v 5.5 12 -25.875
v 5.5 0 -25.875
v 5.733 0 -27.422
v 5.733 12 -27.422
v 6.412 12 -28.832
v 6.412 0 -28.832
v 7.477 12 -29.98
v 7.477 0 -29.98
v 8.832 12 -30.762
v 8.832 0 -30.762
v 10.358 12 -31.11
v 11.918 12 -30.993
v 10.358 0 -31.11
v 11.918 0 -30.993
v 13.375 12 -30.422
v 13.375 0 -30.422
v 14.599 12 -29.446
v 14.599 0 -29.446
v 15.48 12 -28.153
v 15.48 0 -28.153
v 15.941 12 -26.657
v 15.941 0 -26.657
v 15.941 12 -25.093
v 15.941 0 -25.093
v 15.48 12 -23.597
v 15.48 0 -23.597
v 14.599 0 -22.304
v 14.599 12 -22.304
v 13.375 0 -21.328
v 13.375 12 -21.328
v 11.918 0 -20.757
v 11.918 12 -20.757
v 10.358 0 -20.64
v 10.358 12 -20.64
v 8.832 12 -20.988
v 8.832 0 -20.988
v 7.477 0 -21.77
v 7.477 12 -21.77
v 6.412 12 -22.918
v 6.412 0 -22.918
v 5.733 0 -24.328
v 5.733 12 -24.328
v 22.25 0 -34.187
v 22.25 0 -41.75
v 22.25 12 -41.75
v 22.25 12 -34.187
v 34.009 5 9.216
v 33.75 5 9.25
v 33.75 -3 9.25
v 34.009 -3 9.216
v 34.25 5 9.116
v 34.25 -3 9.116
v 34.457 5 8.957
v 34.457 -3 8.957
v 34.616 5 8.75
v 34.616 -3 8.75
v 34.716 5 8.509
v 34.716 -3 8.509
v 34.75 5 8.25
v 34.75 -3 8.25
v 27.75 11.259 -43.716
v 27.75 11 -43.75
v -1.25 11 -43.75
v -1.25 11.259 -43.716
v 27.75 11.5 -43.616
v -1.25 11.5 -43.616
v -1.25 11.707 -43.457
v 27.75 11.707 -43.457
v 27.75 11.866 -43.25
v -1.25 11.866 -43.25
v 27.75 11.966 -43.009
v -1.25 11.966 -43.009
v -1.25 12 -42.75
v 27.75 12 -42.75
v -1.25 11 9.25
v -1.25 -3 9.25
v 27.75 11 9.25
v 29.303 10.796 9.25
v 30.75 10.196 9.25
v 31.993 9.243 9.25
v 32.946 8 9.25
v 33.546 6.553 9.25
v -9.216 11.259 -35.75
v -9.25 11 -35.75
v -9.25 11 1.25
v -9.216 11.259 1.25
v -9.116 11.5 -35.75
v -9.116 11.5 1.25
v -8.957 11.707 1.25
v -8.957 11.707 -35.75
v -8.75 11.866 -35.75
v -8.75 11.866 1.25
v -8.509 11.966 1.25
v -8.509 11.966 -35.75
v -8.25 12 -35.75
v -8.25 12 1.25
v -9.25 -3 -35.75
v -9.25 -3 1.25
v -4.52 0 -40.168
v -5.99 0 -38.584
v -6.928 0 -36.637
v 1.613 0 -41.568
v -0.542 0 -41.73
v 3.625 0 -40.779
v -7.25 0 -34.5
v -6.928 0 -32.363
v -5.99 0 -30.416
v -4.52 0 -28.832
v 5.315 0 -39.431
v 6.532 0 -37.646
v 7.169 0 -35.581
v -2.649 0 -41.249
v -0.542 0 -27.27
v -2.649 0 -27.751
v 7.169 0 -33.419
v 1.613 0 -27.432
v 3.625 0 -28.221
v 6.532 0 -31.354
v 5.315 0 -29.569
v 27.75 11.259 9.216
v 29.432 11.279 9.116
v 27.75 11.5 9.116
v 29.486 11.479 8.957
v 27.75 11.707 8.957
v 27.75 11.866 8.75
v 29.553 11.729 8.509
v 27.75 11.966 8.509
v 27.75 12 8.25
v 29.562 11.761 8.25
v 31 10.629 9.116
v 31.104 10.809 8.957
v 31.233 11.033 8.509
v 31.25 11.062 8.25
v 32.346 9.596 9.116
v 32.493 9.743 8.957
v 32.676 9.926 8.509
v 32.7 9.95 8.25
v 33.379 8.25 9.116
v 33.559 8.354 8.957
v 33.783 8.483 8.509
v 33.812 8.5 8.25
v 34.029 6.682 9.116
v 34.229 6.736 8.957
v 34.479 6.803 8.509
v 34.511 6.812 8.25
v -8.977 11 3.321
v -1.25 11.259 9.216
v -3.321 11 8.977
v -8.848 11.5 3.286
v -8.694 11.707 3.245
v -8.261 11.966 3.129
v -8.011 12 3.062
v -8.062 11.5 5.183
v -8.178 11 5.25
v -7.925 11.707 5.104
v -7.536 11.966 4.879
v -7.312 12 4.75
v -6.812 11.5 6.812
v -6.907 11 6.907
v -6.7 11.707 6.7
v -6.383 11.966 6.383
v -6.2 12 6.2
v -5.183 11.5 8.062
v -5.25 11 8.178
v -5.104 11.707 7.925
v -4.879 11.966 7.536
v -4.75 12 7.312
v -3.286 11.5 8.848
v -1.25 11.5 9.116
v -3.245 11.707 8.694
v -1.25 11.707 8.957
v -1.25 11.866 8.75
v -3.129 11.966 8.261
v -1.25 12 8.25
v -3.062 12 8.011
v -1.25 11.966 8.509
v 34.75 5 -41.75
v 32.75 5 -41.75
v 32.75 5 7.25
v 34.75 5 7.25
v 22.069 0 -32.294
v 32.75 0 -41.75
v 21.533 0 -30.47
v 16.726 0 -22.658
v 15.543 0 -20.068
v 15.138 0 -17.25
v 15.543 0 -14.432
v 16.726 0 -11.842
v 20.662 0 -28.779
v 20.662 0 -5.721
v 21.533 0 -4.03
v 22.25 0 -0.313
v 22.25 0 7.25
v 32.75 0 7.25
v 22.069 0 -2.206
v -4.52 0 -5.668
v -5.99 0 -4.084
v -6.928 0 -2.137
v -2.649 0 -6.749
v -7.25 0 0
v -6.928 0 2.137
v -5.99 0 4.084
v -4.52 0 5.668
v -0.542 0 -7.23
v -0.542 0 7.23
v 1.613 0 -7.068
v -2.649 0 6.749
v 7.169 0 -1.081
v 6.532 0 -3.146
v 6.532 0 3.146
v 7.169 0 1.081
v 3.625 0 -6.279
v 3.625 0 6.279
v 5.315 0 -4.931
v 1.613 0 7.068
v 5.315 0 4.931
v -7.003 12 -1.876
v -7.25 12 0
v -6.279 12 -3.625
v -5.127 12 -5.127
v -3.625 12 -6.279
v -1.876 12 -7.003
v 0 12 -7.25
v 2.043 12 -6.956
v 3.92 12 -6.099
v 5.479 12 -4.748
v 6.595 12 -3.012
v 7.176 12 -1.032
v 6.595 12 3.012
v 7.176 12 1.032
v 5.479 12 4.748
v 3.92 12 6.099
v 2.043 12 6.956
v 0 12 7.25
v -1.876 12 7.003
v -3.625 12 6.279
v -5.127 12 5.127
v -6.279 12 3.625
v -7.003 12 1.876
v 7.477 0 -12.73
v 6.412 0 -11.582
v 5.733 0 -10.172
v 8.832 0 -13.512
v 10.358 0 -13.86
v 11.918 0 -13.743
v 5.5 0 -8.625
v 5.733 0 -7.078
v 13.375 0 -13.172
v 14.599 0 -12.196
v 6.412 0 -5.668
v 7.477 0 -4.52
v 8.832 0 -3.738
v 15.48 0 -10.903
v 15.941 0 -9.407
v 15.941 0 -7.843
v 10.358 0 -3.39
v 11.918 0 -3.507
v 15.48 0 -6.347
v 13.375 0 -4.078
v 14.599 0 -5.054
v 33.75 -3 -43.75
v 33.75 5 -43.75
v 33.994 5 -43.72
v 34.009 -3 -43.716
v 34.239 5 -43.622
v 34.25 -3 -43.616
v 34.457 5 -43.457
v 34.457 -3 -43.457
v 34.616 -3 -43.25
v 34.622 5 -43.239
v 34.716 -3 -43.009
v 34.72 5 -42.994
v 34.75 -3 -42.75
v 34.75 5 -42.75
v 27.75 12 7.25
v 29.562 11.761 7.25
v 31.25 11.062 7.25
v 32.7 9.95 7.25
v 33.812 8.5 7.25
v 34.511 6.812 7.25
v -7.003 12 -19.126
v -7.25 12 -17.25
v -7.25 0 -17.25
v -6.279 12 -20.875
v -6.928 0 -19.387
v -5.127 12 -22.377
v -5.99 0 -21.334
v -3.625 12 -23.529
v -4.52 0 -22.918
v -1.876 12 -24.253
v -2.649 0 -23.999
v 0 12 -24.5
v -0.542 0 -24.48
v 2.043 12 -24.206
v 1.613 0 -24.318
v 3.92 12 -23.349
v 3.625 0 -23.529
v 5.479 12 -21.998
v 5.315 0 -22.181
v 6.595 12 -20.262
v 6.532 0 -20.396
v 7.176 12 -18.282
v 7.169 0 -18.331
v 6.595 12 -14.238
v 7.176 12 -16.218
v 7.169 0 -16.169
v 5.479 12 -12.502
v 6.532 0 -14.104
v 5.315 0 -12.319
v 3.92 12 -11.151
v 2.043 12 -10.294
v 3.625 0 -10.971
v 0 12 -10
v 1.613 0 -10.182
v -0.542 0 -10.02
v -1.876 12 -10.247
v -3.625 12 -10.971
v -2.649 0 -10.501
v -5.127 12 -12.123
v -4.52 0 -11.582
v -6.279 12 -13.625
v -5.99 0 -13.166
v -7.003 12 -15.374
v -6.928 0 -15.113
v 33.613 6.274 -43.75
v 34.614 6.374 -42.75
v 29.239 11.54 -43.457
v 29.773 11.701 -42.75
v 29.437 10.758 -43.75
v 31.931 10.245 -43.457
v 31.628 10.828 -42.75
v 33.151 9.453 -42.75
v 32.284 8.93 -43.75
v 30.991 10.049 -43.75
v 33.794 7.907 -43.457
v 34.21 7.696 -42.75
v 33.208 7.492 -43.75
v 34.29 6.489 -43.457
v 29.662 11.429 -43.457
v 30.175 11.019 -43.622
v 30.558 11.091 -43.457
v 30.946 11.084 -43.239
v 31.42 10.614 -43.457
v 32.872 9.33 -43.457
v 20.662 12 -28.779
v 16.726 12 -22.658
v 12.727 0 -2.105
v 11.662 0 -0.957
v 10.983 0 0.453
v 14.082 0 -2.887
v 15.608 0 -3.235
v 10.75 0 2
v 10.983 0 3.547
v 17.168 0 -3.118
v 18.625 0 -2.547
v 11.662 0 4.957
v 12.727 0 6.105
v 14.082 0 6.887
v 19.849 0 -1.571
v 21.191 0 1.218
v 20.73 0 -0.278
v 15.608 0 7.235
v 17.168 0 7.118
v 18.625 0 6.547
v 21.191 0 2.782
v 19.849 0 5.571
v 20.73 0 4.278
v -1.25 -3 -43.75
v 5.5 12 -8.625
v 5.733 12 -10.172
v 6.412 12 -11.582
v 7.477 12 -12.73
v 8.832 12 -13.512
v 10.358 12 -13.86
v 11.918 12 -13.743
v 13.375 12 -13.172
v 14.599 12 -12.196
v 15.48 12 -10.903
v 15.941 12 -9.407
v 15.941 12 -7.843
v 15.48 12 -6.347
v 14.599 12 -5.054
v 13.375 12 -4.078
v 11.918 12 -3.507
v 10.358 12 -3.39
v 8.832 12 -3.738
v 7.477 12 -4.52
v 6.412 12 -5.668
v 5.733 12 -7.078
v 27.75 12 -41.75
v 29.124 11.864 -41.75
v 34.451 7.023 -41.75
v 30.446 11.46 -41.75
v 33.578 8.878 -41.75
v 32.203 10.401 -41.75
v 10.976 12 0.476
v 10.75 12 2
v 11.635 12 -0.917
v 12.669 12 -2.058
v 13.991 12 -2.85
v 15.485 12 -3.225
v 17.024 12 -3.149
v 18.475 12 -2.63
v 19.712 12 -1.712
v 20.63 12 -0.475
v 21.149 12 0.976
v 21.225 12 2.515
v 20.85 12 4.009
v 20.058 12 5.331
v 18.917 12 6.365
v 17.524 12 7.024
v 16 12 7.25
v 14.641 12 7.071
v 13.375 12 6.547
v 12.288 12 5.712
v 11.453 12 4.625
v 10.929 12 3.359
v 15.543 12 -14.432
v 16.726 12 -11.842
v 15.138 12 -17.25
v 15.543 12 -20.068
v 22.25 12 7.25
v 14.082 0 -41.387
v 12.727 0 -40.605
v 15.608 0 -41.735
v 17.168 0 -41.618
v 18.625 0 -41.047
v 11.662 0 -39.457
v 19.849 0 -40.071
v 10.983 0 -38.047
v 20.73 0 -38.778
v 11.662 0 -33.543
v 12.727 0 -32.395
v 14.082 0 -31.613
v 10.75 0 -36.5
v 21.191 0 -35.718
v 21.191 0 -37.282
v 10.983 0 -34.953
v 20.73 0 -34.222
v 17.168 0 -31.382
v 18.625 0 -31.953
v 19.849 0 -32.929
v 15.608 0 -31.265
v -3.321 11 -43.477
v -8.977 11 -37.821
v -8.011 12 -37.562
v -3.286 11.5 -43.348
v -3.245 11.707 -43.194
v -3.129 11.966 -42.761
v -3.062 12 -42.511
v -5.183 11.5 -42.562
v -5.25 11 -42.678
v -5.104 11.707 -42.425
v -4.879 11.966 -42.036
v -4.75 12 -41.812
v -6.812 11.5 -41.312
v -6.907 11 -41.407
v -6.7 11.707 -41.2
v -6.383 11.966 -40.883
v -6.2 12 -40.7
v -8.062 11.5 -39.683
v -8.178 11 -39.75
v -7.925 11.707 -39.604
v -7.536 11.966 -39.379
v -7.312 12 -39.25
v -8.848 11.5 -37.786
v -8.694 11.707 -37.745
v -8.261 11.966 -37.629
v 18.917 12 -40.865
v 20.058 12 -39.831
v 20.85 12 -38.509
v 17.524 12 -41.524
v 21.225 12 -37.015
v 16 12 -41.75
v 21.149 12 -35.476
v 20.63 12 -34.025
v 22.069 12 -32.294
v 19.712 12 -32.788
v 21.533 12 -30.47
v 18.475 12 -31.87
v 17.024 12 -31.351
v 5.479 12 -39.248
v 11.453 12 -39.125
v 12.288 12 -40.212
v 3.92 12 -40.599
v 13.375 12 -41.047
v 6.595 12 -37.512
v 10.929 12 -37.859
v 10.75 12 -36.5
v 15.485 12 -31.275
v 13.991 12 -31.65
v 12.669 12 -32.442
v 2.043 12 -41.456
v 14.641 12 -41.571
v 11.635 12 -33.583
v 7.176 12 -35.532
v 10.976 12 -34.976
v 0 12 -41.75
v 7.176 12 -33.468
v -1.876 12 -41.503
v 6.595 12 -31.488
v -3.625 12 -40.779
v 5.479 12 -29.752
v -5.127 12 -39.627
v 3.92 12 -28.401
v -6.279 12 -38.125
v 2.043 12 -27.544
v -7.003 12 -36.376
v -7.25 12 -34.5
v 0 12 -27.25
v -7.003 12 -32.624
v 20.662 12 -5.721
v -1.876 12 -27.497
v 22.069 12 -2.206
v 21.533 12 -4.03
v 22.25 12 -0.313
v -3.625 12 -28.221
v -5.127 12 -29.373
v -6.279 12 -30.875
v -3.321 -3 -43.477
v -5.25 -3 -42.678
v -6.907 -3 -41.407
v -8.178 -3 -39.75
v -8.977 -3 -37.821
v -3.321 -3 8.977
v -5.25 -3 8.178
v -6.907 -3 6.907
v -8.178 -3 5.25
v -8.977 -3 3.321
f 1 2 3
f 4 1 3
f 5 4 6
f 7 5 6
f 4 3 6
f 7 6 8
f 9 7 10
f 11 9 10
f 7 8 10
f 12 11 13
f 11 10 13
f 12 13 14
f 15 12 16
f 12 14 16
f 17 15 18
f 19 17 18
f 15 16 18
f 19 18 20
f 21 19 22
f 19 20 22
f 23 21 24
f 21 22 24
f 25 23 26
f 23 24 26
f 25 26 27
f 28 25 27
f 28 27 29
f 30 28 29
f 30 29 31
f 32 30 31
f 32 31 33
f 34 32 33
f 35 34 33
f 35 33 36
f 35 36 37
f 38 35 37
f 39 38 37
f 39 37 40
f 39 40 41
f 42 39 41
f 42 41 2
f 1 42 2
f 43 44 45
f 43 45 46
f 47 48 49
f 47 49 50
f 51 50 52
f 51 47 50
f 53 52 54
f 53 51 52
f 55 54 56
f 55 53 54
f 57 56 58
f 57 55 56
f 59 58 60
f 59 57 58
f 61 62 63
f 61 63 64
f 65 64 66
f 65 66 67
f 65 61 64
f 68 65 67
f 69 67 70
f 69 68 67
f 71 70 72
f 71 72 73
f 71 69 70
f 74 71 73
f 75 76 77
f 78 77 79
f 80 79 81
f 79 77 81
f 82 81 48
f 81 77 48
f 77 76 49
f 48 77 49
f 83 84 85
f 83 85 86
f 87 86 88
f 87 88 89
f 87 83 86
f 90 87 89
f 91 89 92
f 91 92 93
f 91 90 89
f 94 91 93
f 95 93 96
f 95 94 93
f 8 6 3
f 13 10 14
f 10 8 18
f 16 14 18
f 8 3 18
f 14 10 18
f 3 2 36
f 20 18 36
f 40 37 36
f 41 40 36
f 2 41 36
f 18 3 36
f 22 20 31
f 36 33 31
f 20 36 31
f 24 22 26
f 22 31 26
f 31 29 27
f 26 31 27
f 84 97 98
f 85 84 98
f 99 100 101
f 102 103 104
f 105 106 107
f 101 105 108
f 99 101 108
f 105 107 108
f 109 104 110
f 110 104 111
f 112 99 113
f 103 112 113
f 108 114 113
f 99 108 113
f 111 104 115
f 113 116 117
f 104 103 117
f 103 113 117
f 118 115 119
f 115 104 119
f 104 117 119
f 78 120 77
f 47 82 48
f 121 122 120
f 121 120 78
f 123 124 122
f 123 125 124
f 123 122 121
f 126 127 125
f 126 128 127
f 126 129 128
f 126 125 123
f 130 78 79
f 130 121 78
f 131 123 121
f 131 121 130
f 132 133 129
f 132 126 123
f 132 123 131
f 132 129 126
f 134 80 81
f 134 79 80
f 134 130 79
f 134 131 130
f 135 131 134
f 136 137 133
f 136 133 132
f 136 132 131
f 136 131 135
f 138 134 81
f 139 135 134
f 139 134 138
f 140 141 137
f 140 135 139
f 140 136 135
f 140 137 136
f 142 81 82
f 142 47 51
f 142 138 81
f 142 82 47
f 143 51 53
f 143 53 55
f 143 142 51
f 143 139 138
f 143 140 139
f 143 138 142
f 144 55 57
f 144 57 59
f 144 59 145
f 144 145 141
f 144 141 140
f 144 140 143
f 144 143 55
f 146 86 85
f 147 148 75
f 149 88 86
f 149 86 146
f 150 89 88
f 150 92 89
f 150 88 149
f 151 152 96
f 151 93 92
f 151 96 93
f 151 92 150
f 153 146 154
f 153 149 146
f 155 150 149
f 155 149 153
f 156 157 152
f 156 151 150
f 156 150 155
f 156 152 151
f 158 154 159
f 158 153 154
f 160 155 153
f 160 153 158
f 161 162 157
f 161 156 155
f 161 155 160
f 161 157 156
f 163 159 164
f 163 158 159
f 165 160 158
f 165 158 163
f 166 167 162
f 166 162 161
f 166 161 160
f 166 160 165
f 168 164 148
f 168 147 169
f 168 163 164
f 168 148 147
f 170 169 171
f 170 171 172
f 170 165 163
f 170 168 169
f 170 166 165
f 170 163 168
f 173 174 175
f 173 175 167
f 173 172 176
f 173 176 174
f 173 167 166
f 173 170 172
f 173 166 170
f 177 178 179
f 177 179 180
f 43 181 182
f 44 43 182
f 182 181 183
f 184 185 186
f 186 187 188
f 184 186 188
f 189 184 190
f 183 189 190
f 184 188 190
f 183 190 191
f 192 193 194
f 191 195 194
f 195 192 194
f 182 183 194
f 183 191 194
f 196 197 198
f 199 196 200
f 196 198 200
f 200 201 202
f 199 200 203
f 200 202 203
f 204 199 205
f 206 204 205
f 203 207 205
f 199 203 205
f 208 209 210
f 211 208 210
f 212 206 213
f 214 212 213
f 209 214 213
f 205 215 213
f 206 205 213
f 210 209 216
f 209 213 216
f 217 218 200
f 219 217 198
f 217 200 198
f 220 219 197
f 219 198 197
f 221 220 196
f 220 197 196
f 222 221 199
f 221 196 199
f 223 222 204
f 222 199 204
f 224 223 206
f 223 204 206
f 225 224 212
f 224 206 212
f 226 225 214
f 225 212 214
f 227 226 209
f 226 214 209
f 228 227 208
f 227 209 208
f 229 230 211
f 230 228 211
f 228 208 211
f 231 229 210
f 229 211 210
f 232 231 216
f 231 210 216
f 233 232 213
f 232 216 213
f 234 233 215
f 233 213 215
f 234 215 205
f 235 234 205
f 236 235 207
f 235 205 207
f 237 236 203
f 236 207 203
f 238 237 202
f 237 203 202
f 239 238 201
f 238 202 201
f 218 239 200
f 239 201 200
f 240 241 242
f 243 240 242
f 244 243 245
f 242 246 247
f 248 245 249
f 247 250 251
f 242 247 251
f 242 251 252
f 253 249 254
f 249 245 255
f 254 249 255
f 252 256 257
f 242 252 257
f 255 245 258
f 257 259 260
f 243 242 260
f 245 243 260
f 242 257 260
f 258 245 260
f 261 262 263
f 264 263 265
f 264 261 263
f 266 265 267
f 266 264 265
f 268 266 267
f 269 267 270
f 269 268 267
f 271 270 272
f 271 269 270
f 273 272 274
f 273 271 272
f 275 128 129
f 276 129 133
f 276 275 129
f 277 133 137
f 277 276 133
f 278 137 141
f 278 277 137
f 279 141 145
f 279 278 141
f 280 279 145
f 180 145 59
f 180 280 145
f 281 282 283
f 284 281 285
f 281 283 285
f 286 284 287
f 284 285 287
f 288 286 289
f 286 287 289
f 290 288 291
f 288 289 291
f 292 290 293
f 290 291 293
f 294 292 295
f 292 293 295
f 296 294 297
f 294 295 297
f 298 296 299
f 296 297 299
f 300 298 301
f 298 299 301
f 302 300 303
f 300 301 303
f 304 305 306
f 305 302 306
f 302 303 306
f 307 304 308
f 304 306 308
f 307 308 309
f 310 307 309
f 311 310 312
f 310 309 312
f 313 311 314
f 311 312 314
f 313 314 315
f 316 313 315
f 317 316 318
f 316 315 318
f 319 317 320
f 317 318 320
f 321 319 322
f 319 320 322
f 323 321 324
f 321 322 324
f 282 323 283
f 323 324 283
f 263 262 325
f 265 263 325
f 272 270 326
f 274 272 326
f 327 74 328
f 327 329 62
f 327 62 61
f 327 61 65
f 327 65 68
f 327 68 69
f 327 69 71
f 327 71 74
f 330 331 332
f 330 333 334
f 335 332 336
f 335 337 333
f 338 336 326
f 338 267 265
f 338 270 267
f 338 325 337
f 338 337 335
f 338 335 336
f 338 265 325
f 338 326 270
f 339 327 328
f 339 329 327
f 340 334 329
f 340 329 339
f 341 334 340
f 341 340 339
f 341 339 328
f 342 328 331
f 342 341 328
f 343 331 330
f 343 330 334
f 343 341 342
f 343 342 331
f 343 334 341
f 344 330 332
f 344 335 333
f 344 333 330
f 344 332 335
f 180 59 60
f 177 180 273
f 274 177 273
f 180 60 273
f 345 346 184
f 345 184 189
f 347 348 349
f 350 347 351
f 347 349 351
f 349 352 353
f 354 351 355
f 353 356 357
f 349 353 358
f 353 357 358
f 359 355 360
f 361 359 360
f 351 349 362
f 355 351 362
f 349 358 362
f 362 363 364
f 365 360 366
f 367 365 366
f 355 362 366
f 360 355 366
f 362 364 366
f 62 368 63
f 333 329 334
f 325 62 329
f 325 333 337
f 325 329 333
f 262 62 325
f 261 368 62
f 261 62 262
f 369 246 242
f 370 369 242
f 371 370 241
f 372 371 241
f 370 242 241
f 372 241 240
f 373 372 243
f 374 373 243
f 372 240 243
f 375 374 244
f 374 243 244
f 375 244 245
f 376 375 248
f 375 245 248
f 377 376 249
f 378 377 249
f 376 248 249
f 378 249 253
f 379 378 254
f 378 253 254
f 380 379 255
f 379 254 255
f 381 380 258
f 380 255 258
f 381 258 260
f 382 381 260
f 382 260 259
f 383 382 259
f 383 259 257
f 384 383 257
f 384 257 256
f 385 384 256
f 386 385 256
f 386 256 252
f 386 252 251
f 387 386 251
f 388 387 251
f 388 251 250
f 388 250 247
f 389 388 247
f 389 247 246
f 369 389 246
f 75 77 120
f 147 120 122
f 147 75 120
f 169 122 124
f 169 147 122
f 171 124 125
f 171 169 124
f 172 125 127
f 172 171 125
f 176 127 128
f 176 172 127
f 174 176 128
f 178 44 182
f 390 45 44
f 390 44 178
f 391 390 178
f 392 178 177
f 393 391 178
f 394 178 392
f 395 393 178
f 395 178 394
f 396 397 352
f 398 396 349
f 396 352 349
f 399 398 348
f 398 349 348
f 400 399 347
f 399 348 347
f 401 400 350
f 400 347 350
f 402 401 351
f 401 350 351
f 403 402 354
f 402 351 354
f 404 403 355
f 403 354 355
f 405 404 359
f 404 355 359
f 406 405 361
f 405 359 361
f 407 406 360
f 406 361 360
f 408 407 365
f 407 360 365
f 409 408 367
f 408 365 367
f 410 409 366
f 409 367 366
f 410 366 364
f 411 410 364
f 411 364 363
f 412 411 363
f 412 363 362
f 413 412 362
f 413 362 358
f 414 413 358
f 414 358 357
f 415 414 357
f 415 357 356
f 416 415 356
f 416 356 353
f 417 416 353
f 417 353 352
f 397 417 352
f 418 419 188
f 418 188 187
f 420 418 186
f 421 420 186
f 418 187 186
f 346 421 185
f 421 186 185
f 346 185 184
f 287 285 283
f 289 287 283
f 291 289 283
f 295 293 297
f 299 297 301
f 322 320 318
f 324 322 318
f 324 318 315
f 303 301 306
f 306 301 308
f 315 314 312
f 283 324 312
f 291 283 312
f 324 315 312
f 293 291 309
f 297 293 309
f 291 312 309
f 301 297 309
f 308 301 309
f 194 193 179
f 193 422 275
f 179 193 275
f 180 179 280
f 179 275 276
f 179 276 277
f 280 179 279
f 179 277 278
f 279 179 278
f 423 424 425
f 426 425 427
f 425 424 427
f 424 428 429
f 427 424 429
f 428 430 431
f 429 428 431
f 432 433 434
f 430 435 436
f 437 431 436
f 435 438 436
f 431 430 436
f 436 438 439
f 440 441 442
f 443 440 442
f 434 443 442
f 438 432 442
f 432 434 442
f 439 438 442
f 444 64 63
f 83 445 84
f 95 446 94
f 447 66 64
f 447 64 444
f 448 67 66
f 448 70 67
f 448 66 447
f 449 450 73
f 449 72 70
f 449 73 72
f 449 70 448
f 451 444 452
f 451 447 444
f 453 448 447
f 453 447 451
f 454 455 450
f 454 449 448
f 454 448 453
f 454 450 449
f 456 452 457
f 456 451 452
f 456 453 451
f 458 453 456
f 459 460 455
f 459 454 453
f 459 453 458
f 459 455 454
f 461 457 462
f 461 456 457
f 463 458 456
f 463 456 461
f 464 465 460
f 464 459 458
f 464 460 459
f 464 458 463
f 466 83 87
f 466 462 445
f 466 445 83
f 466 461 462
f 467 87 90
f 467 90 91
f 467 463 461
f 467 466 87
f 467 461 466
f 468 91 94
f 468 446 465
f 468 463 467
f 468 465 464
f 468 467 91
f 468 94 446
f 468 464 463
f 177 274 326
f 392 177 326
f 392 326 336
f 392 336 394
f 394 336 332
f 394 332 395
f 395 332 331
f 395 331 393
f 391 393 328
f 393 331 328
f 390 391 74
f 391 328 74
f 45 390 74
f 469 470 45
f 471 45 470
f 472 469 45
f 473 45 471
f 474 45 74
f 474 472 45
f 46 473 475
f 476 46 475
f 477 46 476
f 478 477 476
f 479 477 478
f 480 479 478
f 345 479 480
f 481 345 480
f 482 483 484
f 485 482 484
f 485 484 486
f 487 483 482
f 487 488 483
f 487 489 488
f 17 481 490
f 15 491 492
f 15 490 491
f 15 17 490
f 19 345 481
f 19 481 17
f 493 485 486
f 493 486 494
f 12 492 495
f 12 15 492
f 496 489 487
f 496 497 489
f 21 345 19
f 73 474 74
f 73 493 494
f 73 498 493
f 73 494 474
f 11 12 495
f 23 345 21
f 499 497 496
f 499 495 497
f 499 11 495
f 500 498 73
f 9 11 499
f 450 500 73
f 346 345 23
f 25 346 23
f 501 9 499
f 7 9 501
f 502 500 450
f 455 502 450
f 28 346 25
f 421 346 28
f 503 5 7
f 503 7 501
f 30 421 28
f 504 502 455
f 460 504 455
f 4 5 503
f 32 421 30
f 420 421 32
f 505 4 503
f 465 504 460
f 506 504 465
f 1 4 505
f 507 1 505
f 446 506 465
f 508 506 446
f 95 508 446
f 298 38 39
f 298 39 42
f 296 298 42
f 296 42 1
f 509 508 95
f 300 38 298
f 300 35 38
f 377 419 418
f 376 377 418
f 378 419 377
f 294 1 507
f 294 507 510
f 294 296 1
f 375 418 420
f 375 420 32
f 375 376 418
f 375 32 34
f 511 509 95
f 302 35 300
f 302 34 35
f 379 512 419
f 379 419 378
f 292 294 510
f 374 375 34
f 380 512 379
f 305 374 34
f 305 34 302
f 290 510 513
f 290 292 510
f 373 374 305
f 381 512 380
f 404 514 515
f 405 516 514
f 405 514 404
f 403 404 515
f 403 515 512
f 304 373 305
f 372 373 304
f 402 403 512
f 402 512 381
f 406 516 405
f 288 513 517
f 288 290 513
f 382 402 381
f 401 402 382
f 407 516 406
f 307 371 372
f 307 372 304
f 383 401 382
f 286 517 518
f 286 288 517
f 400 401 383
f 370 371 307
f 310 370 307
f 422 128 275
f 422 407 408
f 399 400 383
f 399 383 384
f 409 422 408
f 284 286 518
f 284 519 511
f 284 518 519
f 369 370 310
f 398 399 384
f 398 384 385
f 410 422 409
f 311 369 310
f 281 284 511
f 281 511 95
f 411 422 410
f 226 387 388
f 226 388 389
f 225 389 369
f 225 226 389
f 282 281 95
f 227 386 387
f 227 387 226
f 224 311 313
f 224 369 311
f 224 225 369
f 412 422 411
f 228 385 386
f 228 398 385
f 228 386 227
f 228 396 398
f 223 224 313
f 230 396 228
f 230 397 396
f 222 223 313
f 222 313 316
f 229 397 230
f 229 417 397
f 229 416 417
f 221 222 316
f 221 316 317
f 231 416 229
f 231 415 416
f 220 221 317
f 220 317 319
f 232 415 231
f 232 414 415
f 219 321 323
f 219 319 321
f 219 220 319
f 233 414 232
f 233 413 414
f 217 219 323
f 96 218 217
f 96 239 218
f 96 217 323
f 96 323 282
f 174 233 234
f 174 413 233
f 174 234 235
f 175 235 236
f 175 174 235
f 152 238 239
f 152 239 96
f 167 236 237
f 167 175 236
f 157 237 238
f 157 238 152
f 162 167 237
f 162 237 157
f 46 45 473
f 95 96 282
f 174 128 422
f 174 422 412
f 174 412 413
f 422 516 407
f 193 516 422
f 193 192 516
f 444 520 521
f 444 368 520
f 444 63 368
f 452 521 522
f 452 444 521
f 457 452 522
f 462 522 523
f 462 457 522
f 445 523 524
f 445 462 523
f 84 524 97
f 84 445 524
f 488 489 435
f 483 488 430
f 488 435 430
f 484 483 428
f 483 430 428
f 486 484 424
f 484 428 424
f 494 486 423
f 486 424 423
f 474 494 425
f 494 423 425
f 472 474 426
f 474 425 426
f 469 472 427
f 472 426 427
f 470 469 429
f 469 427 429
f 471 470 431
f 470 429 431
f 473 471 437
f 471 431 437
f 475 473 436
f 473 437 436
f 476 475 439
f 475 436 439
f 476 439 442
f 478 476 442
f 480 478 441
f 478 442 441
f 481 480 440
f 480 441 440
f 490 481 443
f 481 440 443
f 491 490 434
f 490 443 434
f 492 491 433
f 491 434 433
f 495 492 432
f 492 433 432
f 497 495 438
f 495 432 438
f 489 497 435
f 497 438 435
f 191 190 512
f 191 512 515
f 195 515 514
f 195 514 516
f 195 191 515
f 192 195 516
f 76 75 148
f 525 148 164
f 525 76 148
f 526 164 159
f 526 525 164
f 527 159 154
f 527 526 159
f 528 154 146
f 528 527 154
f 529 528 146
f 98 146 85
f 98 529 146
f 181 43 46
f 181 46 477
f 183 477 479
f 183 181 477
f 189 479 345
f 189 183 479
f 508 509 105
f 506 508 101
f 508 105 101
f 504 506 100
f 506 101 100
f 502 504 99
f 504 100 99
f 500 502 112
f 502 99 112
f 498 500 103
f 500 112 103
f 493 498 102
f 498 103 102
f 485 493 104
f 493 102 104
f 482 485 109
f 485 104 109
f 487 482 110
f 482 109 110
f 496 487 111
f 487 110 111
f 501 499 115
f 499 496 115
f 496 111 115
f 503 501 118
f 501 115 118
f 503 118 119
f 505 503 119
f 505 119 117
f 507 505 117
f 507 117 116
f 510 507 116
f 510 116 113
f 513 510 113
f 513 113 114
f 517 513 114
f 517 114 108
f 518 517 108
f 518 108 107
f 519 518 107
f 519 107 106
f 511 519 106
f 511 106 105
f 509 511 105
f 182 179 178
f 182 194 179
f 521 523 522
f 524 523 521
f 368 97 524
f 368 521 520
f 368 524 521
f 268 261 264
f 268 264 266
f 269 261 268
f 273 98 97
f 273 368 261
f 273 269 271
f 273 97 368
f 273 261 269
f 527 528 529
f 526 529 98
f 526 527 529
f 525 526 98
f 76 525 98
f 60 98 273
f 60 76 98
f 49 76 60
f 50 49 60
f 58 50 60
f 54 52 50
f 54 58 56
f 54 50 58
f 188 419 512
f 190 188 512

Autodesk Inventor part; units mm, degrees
ref_plane "YZ Plane" through (0, 0, 0) normal (1, 0, 0) x (0, 1, 0)
ref_plane "XZ Plane" through (0, 0, 0) normal (0, 1, 0) x (-1, 0, 0)
ref_plane "XY Plane" through (0, 0, 0) normal (0, 0, 1) x (1, 0, 0)
sketch "Sketch1" plane through (0, 0, 0) normal (0, 1, 0) x (-1, 0, 0)
  circle A0 centre (0, 0) radius 7.25
  line L0 (0, -7.25) -> (0, -17.25)
  circle A1 centre (0, -17.25) radius 7.25
  line L1 (0, -24.5) -> (0, -34.5)
  circle A2 centre (0, -34.5) radius 7.25
  line L2 (0, -7.25) -> (0, -10)
  line L3 (0, -24.5) -> (0, -27.25)
  line L4 (0, 7.25) -> (-16, 7.25)
  line L5 (-16, 7.25) -> (-16, 2)
  circle A3 centre (-16, 2) radius 5.25
  line L6 (0, -41.75) -> (-16, -41.75)
  line L7 (-16, -41.75) -> (-16, -36.5)
  circle A4 centre (-16, -36.5) radius 5.25
  line L8 (0, -8.625) -> (-16, -8.625)
  line L9 (0, -25.875) -> (-16, -25.875)
  circle A5 centre (-10.75, -8.625) radius 5.25
  circle A6 centre (-10.75, -25.875) radius 5.25
  line L10 (-16, 7.25) -> (-22.25, 7.25)
  line L11 (-22.25, 7.25) -> (-32.75, 7.25)
  line L12 (-32.75, 7.25) -> (-32.75, -41.75)
  line L13 (-32.75, -41.75) -> (-22.25, -41.75)
  line L14 (-22.25, -41.75) -> (-22.25, 7.25)
  line L15 (7.25, 7.25) -> (9.25, 7.25)
  line L16 (9.25, 7.25) -> (9.25, 9.25)
  line L17 (-32.75, -41.75) -> (-32.75, -43.75)
  line L18 (-32.75, -43.75) -> (-34.75, -43.75)
  line L19 (9.25, 9.25) -> (-34.75, 9.25)
  line L20 (-34.75, 9.25) -> (-34.75, -43.75)
  line L21 (-34.75, -43.75) -> (9.25, -43.75)
  line L22 (9.25, -43.75) -> (9.25, 9.25)
  dimension "d0" = 14.5
  dimension "d14" = 10
  dimension "d15" = 14.5
  dimension "d16" = 10
  dimension "d17" = 14.5
  dimension "d23" = 16
  dimension "d24" = 5.25
  dimension "d25" = 10.5
  dimension "d26" = 16
  dimension "d27" = 5.25
  dimension "d28" = 10.5
  dimension "d29" = 10.5
  dimension "d31" = 6.25
  dimension "d32" = 10.5
  dimension "d33" = 2
  dimension "d34" = 2
  dimension "d35" = 2
  dimension "d36" = 2
extrude "Extrusion1" add sketch "Sketch1" along normal blind 12
sketch "Sketch2" plane through (0, 0, 0) normal (0, -1, 0) x (1, 0, 0)
  line L0 (34.75, 9.25) -> (34.75, -43.75) projected
  line L1 (34.75, 9.25) -> (-9.25, 9.25)
  line L2 (-9.25, 9.25) -> (-9.25, -43.75)
  line L3 (-9.25, -43.75) -> (34.75, -43.75)
  line L4 (34.75, -43.75) -> (34.75, 9.25)
  point P0 (0, 0)
extrude "Extrusion2" add sketch "Sketch2" along normal blind 3
sketch "Sketch3" plane through (0, 12, 0) normal (0, 1, 0) x (1, 0, 0)
  line L0 (32.75, 41.75) -> (32.75, -7.25) projected
  line L1 (32.75, 41.75) -> (34.75, 41.75)
  line L2 (34.75, -9.25) -> (34.75, 43.75) projected
  line L3 (32.75, -7.25) -> (34.75, -7.25)
  line L4 (34.75, -7.25) -> (34.75, 41.75)
  line L5 (34.75, 41.75) -> (32.75, 41.75)
  line L6 (32.75, 41.75) -> (32.75, -7.25)
  point P0 (0, 0)
extrude "Extrusion3" cut sketch "Sketch3" against normal blind 7
fillet "Fillet1" radius 7 1 edges at (34.75, 12, 8.25)
fillet "Fillet2" radius 7 1 edges at (34.75, 12, -42.75)
sketch "Sketch4" plane through (0, 12, 0) normal (0, 1, 0) x (1, 0, 0)
  line L0 (22.25, 41.75) -> (27.75, 41.75) projected
  line L1 (22.25, 41.75) -> (22.25, 31.25)
  line L2 (22.25, -7.25) -> (22.25, 41.75) projected
  line L3 (22.25, -7.25) -> (22.25, 3.25)
  line L4 (16, 17.25) -> (22.25, 31.25)
  line L5 (16, 17.25) -> (22.25, 3.25)
  line L6 (22.25, 17.25) -> (13.25, 17.25)
  line L7 (13.25, 17.25) -> (22.25, 31.25)
  line L8 (13.25, 17.25) -> (22.25, 3.25)
  line L9 (22.25, 31.25) -> (22.25, 3.25)
  point P0 (0, 0)
  dimension "d45" = 10.5
  dimension "d46" = 9
extrude "Extrusion4" cut sketch "Sketch4" against normal blind 12 contours L6 L4 L2
extrude "Extrusion5" cut sketch "Sketch4" against normal blind 12 contours L5 L6 L2
extrude "Extrusion6" cut sketch "Sketch4" against normal blind 12 contours L8 L6 L5
extrude "Extrusion7" cut sketch "Sketch4" against normal through all contours L6 L7 L4
sketch "Sketch5" plane through (0, -3, 0) normal (0, -1, 0) x (1, 0, 0)
  line L0 (34.75, 9.25) -> (-9.25, 9.25)
  line L1 (-9.25, 9.25) -> (-9.25, -43.75)
  line L2 (-9.25, -43.75) -> (34.75, -43.75)
  line L3 (34.75, -43.75) -> (34.75, 9.25)
  point P0 (0, 0)
extrude "Extrusion8" add sketch "Sketch5" against normal blind 3
fillet "Fillet3" radius 10 1 edges at (22.25, 6, -31.25)
fillet "Fillet4" radius 10 1 edges at (22.25, 6, -3.25)
fillet "Fillet5" radius 10 1 edges at (13.25, 6, -17.25)
sketch "Sketch6" plane through (-9.25, -3, 9.25) normal (0, 0, 1) x (1, 0, 0)
  point P0 (9.25, 3)
sketch "Sketch7" plane through (0, 12, 0) normal (0, 1, 0) x (1, 0, 0)
  point P0 (0, 0)
fillet "Fillet6" radius 8 1 edges at (-9.25, 4.5, 9.25)
fillet "Fillet7" radius 8 1 edges at (-9.25, 4.5, -43.75)
fillet "Fillet8" radius 1 7 edges at (32.6997, 9.9497, 9.25) (13.25, 12, 9.25) (-6.9069, 12, 6.9069) (-6.9069, 12, -41.4069) (32.6997, 9.9497, -43.75) (34.75, 1, -43.75) (34.75, 1, 9.25)
properties part number "multi_battery_holder_3DPrint"
